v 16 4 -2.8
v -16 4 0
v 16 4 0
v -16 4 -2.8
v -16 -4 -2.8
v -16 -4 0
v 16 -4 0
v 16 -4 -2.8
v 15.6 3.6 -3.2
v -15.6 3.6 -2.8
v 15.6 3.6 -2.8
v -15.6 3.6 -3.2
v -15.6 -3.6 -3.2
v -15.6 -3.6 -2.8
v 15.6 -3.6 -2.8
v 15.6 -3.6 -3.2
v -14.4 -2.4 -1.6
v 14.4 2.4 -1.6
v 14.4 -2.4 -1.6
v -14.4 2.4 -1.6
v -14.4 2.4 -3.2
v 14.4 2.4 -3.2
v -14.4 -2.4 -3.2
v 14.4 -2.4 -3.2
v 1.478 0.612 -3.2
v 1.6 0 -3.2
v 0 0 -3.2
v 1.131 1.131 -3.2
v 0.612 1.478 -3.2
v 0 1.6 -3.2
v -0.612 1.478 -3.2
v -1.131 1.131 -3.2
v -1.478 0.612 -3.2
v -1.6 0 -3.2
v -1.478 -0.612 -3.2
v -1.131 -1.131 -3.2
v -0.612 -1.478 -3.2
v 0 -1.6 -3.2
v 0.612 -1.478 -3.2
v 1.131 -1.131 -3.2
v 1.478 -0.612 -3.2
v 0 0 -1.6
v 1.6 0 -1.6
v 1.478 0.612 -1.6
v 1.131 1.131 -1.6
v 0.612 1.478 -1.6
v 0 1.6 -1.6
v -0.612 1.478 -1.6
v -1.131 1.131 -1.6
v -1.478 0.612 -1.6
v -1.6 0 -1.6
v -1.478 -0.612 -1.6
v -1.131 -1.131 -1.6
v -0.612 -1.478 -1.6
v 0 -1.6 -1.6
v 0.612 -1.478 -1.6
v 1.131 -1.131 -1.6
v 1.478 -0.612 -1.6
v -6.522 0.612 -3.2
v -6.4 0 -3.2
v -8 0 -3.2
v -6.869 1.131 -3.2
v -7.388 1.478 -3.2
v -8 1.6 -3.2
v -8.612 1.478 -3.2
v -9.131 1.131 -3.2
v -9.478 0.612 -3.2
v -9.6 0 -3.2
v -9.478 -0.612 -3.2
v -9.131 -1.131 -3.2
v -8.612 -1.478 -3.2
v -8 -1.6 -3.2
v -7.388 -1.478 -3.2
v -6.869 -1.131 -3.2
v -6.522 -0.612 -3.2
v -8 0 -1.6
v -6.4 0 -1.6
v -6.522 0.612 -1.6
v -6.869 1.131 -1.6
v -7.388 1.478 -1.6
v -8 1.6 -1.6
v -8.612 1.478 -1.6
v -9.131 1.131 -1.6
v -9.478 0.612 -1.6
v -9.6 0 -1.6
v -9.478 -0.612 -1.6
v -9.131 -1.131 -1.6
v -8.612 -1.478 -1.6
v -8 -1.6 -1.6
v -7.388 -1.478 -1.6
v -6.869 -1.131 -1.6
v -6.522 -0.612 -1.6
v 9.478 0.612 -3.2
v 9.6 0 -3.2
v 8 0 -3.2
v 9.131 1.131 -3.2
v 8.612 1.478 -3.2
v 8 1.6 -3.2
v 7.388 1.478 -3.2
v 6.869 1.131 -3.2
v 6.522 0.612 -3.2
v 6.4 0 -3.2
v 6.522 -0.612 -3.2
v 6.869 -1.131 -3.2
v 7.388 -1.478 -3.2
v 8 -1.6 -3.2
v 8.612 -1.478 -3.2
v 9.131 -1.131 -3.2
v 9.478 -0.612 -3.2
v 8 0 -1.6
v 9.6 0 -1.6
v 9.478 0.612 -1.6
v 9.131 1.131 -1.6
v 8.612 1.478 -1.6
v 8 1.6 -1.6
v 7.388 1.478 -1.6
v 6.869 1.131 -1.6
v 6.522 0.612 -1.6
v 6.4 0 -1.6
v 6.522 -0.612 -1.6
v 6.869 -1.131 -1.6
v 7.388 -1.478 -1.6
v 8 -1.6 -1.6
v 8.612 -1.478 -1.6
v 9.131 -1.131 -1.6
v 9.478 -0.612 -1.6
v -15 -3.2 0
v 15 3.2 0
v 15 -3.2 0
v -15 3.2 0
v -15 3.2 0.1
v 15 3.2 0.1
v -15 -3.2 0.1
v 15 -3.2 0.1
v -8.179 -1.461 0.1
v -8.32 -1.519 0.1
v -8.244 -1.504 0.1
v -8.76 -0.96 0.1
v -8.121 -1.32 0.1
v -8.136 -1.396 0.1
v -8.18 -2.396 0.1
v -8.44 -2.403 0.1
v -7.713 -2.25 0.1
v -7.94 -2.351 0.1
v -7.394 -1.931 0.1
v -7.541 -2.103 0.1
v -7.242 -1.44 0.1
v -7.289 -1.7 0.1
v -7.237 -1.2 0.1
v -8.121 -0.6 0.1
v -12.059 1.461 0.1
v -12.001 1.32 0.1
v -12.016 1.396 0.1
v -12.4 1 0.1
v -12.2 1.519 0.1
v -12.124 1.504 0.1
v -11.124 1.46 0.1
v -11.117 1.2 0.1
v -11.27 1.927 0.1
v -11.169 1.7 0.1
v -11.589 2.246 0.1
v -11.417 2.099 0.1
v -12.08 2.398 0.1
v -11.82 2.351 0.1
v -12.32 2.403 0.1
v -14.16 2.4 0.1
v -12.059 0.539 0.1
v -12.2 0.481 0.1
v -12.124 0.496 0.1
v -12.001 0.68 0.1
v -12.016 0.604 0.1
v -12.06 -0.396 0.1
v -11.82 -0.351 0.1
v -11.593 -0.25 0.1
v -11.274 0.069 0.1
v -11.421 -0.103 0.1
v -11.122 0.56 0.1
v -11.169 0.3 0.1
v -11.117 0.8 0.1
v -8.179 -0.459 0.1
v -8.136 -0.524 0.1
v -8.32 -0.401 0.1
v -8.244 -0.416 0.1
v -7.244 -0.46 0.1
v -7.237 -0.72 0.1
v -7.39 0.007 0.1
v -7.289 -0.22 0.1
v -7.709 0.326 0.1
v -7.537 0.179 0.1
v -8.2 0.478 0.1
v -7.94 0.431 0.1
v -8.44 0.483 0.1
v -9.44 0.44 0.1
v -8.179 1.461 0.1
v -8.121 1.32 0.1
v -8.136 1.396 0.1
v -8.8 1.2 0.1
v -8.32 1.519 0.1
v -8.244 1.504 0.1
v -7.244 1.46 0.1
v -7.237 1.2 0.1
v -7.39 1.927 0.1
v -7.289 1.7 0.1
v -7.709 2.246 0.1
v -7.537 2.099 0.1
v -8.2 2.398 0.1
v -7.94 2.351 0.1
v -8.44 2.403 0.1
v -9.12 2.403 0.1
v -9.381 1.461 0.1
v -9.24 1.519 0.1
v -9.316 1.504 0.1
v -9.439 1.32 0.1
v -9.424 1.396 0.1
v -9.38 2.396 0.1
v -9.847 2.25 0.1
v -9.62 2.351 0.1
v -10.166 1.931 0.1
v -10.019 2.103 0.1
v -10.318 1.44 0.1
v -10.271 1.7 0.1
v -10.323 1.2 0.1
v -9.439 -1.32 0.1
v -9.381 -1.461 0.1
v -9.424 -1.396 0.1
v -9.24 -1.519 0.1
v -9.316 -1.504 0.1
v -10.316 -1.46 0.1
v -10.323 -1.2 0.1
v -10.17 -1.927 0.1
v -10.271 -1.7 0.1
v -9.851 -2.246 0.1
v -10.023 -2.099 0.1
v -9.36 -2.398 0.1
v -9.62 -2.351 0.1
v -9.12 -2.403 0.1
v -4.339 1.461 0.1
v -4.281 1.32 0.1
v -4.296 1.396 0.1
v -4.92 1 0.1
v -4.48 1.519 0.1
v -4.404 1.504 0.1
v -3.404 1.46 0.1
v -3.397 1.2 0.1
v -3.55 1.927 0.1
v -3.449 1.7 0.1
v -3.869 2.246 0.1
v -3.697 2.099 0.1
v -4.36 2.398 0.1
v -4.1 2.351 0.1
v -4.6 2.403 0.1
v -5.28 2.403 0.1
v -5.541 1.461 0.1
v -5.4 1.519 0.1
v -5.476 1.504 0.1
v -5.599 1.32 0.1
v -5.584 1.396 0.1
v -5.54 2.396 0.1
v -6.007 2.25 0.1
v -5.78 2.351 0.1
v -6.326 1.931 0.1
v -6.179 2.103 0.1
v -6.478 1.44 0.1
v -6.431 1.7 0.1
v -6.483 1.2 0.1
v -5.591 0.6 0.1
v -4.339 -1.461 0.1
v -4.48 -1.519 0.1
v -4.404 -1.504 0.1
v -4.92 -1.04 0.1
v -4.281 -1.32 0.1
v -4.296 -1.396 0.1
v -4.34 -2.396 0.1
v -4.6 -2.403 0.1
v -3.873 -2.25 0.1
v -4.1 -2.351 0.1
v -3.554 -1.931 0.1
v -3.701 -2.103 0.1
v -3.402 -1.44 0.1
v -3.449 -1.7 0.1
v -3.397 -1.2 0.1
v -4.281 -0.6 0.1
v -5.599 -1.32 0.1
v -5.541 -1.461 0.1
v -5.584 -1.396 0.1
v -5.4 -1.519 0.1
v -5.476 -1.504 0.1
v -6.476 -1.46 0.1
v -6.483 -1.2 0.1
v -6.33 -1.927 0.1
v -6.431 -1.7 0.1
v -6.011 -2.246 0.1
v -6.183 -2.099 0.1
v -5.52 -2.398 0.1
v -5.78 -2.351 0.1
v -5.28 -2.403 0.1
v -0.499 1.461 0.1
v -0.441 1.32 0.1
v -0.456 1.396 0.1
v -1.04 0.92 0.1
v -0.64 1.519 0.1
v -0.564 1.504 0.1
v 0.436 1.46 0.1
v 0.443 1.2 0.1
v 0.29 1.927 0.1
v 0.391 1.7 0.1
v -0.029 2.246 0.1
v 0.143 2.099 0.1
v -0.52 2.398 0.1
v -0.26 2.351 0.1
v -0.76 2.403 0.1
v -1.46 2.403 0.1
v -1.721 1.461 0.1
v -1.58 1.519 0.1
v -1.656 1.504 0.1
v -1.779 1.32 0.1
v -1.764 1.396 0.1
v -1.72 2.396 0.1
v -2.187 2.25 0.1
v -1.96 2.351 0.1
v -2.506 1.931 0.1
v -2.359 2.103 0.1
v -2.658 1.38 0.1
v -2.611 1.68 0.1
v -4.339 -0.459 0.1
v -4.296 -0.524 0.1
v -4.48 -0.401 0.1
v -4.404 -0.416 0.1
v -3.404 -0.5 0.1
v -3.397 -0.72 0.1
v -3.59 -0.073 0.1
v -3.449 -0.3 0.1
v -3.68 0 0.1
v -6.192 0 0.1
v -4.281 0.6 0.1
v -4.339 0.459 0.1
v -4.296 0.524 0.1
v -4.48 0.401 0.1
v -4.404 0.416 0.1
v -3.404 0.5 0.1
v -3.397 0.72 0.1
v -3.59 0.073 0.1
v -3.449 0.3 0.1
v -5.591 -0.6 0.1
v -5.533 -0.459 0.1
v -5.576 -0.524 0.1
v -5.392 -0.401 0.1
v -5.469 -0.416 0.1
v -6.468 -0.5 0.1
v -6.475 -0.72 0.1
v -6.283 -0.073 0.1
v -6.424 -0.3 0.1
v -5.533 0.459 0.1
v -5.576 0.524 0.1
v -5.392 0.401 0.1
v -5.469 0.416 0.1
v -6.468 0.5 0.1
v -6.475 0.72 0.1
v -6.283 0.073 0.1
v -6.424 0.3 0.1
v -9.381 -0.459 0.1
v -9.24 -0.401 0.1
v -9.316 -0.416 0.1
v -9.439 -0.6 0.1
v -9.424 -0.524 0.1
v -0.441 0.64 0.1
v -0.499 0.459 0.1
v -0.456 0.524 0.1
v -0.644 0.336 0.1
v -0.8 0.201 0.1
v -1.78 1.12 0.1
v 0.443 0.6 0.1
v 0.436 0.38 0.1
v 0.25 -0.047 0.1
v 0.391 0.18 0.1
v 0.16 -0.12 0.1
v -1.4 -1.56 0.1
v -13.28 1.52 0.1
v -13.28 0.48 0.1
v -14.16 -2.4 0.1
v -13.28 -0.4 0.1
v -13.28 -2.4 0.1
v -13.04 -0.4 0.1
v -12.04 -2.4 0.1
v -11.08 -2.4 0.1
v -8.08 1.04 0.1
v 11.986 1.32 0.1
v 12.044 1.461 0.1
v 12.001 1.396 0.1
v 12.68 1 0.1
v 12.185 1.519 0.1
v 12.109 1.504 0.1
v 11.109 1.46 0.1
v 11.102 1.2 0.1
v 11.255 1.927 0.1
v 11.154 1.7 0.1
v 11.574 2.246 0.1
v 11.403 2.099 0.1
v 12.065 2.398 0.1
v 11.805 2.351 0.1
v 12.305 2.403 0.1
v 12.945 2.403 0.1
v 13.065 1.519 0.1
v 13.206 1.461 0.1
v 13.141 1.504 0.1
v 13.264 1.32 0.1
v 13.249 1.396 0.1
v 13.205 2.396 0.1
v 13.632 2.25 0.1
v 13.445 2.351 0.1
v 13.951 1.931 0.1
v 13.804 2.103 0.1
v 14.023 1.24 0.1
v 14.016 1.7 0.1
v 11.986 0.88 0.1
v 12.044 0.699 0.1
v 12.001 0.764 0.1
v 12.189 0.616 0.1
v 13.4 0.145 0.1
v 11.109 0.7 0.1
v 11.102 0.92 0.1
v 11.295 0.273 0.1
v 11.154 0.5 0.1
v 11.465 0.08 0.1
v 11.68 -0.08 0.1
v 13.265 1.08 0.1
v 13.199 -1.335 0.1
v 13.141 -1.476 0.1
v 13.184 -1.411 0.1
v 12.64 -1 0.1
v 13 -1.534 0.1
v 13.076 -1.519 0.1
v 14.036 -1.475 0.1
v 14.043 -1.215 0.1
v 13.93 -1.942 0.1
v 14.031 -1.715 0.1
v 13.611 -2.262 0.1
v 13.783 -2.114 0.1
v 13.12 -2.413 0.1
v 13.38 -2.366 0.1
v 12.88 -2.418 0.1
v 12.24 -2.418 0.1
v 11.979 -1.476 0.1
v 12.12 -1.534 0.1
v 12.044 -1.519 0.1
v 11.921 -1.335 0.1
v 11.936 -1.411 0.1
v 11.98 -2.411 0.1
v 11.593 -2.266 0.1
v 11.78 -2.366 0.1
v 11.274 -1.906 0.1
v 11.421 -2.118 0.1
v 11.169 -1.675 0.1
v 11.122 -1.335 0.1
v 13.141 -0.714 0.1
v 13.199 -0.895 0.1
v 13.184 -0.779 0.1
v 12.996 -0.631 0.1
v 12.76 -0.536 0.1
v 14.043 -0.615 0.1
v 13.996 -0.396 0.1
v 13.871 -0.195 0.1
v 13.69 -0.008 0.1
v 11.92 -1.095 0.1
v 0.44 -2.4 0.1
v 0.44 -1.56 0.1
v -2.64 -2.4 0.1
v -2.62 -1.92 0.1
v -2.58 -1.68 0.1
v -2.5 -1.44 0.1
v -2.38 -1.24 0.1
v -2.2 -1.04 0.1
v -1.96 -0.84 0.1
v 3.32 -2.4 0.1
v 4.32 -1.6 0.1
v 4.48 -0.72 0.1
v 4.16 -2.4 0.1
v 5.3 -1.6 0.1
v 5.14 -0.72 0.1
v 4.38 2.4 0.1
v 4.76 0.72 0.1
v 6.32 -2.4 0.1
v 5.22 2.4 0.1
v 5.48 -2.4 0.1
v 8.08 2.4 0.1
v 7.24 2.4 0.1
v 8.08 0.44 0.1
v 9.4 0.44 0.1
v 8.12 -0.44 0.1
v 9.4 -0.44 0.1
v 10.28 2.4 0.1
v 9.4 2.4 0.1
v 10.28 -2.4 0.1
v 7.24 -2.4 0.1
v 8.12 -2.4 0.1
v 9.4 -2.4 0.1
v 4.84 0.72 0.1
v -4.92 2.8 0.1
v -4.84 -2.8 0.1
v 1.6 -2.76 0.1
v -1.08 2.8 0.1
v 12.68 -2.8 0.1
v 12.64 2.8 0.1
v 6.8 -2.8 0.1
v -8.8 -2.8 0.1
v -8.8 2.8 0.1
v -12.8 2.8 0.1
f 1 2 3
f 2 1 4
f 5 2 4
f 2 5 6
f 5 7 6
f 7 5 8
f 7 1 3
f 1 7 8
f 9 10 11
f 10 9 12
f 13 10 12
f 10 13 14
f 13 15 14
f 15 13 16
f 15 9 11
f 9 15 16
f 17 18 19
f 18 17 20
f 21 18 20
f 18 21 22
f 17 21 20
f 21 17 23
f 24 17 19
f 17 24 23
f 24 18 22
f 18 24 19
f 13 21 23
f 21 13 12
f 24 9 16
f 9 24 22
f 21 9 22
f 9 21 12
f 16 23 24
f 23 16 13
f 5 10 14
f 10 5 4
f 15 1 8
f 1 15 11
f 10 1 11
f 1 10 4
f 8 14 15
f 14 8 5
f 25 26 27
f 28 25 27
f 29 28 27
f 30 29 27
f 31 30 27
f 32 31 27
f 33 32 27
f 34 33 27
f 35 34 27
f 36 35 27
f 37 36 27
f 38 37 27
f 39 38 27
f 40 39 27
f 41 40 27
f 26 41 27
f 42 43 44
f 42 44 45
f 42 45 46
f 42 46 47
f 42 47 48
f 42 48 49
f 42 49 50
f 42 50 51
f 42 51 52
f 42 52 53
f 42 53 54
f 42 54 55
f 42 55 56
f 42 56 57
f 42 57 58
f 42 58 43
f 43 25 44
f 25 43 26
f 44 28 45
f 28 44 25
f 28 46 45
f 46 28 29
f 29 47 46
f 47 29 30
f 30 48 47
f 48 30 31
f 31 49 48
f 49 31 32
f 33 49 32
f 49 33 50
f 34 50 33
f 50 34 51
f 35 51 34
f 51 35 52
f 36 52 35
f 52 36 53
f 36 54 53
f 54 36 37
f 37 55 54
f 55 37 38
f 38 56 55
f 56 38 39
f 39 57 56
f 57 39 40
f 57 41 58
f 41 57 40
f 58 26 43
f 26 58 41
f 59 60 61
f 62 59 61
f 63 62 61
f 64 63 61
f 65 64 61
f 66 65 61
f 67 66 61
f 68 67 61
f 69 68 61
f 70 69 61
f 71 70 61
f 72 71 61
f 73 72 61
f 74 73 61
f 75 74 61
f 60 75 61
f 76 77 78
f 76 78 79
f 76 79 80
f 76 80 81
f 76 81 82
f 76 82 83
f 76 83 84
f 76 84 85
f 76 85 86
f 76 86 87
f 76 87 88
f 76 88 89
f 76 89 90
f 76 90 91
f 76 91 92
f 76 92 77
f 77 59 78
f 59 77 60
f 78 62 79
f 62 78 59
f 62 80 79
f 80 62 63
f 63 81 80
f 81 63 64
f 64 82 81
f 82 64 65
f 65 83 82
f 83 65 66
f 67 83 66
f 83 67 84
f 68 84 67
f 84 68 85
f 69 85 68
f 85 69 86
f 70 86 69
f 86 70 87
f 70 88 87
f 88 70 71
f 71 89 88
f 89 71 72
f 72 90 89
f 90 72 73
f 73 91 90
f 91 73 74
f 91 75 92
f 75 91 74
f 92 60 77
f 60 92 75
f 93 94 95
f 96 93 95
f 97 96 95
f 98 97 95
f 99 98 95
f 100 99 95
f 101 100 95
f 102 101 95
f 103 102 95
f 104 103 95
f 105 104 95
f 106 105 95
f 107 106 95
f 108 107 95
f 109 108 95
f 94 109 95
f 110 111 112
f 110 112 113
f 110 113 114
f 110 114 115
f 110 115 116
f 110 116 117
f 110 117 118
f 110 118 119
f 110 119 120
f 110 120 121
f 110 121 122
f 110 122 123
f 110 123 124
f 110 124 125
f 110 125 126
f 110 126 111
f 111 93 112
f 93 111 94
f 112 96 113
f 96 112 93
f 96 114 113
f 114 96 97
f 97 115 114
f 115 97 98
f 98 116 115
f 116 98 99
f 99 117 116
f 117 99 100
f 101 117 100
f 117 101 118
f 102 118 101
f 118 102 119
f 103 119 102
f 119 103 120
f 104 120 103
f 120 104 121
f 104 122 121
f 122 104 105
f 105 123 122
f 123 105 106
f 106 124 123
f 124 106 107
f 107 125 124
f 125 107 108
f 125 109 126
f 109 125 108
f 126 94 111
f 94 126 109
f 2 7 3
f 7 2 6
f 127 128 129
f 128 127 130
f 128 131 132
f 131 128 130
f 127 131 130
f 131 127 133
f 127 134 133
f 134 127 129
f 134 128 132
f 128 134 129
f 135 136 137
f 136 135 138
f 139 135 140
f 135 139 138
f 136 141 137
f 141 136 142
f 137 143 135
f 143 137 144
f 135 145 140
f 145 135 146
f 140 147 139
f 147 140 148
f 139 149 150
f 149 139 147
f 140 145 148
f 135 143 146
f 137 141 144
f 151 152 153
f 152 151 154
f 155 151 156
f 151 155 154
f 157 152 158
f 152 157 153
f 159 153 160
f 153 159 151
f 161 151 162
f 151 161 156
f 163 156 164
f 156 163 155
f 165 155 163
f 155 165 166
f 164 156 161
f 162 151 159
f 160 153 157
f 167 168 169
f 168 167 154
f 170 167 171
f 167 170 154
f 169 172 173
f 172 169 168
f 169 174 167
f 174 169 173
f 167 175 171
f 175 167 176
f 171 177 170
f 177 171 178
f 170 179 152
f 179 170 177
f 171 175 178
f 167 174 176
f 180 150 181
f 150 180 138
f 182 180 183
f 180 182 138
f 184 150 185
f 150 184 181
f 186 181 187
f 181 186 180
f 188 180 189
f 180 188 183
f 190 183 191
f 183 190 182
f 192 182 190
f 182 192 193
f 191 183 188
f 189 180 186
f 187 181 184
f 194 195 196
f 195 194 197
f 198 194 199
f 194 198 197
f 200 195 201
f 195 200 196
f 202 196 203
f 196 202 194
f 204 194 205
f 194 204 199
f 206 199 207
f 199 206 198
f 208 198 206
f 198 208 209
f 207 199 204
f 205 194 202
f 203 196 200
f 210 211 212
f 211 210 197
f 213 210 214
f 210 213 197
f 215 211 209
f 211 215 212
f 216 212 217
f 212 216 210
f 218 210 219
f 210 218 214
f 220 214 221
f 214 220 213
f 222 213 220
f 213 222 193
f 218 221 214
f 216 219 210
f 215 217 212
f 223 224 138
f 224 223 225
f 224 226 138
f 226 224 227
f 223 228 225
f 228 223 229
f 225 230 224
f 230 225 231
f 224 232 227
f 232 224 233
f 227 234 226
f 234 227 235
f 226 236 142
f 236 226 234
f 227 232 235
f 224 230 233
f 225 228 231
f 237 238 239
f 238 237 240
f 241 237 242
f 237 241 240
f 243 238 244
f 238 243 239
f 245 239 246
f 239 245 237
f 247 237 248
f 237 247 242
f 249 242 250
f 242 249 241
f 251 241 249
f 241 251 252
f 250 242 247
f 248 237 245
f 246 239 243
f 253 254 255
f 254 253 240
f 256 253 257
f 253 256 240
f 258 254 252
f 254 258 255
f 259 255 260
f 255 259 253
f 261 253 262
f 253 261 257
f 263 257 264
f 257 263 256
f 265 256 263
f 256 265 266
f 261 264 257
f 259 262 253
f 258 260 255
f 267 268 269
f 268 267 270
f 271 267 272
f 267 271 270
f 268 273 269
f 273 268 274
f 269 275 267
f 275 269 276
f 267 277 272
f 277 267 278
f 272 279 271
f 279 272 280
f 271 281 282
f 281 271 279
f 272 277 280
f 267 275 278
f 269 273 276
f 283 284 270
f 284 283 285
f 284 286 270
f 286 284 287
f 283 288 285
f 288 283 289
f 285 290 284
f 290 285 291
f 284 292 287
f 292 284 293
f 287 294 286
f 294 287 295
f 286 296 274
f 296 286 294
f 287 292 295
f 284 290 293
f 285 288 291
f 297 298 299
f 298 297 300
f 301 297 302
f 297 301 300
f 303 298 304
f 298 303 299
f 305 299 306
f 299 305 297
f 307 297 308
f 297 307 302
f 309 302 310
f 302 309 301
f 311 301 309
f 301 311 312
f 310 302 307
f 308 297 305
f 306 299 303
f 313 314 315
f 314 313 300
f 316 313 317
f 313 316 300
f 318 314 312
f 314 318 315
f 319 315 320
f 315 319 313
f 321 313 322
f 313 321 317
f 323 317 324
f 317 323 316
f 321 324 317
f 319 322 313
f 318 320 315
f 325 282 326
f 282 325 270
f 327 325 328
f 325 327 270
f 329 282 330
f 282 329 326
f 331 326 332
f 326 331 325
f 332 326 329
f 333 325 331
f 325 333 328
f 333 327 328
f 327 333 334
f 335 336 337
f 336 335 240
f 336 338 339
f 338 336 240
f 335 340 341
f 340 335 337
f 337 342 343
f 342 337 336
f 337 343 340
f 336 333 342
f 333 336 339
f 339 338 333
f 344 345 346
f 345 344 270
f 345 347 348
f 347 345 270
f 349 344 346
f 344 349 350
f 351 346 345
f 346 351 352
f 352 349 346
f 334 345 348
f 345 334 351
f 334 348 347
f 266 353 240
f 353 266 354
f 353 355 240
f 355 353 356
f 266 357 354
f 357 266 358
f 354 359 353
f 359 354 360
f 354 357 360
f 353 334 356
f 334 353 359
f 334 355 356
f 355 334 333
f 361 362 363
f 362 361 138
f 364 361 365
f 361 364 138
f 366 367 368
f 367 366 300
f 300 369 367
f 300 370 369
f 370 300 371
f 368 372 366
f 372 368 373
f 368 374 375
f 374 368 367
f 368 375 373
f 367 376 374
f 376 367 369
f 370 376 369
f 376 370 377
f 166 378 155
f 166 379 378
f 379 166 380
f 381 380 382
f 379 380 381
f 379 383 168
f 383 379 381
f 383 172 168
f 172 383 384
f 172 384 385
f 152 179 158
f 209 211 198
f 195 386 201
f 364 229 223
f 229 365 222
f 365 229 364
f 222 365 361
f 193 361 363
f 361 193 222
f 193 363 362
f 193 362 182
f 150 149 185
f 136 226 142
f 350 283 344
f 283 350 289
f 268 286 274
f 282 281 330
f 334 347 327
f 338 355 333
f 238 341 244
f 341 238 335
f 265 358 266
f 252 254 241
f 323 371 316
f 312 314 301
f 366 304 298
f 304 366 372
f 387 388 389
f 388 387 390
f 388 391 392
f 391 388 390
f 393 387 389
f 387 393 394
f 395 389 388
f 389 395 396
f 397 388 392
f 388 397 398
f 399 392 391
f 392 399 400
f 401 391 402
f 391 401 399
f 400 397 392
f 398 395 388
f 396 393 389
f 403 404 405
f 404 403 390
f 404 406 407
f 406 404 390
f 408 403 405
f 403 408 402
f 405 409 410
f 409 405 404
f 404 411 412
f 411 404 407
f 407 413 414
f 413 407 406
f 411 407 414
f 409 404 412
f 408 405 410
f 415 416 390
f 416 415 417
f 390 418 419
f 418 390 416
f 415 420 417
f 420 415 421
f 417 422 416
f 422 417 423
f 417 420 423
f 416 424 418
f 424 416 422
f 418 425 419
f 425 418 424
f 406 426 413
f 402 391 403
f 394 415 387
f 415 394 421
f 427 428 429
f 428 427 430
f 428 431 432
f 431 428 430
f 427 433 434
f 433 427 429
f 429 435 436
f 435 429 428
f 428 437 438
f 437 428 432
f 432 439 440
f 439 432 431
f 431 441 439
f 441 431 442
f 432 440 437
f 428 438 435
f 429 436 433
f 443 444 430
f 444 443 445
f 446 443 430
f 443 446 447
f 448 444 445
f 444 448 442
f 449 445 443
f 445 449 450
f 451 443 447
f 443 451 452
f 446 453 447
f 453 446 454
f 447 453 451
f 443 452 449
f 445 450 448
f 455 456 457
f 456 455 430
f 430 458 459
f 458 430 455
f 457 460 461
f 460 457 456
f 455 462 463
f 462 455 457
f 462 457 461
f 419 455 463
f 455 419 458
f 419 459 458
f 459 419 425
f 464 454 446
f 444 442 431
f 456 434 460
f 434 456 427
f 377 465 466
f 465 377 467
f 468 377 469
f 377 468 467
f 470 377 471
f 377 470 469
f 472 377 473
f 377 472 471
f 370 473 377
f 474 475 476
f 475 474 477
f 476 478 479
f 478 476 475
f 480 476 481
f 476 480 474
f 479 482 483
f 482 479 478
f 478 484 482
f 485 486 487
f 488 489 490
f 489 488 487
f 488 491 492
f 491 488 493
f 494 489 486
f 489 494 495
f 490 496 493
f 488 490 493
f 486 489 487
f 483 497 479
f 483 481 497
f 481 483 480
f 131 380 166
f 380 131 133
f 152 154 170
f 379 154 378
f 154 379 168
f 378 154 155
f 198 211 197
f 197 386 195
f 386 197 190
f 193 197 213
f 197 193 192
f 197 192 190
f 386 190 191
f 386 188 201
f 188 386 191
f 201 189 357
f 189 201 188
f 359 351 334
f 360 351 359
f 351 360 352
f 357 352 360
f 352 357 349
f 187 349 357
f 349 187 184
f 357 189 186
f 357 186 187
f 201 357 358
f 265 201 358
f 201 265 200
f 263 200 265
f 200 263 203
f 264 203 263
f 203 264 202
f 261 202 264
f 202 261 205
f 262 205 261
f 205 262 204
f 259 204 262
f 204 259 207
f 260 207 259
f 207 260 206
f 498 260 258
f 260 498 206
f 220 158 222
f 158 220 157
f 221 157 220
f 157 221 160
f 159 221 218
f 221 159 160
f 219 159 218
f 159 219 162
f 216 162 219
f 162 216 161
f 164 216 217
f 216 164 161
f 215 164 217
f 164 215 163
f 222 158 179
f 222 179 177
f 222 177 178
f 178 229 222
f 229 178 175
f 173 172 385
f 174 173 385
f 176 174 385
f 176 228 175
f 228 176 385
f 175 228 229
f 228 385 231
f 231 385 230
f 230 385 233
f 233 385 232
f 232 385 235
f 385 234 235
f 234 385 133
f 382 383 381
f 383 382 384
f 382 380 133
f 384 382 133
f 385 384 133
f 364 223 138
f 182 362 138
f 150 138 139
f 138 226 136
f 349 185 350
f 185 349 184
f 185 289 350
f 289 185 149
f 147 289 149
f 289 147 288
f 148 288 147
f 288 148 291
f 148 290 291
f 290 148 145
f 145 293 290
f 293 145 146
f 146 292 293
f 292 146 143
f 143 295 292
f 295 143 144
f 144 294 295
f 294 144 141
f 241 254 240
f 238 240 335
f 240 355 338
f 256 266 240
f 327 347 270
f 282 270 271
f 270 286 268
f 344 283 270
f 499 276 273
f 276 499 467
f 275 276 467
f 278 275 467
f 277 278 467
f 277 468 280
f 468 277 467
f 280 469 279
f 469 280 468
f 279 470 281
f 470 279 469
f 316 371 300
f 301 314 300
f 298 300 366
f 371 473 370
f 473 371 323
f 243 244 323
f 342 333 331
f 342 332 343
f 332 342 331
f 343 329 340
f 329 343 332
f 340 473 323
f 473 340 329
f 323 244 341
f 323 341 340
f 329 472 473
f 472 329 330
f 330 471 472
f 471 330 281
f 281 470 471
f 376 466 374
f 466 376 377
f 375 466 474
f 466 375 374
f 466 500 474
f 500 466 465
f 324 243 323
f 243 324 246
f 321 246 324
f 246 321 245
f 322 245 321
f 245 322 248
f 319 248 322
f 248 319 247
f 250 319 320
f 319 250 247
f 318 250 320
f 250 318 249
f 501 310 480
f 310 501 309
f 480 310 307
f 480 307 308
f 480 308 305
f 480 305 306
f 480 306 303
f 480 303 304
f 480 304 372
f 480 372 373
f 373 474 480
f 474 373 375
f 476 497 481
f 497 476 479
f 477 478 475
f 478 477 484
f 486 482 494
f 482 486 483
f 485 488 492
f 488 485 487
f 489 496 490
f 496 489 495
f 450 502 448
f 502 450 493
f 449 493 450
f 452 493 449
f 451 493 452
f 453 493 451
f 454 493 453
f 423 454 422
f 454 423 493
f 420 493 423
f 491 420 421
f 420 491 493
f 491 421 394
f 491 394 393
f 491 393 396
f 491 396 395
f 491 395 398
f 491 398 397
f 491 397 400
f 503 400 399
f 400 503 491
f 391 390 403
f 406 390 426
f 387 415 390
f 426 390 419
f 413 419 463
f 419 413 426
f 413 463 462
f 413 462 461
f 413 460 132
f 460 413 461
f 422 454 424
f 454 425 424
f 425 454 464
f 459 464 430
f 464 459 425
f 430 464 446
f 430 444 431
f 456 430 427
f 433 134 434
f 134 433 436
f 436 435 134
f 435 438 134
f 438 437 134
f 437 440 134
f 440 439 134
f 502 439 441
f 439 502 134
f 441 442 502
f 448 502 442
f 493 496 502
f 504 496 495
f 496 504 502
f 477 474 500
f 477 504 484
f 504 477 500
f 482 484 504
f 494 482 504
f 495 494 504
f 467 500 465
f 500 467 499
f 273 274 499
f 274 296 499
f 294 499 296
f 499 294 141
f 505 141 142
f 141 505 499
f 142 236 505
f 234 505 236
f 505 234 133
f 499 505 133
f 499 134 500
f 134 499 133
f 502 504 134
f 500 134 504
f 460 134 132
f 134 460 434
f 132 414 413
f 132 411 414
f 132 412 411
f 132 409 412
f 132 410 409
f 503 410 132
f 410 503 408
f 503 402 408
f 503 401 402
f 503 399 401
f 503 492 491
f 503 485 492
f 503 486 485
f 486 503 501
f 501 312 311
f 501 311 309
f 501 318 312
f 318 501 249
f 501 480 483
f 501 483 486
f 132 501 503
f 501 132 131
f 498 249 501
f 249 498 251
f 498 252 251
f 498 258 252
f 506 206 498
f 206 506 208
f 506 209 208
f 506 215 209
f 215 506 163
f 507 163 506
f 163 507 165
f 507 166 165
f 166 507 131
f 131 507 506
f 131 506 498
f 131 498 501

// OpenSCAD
use <../lib.scad>
use <2431.scad>
use <6062886c.scad>
function ldraw_lib__2431d08() = [
// 0 Tile  1 x  4 with "R682 AHS" on Yellow Background Sticker
// 0 Name: 2431d08.dat
// 0 Author: Evert-Jan Boer [ejboer]
// 0 !LDRAW_ORG Shortcut UPDATE 2024-10
// 0 !LICENSE Licensed under CC BY 4.0 : see CAreadme.txt
// 
// 0 BFC CERTIFY CCW
  [0,"BFC","CERTIFY"],
  [0,"BFC","CCW"],
// 
// 0 !CATEGORY Sticker Shortcut
// 0 !KEYWORDS Bricklink 2431pb568, Mini Cooper, set 10242
// 
// 0 !HISTORY 2024-09-30 [OrionP] Official Update 2024-08
// 0 !HISTORY 2024-11-09 [MagFors] Update description
// 0 !HISTORY 2024-12-01 [OrionP] Official Update 2024-10
// 
// 1 16 0 0 0 1 0 0 0 1 0 0 0 1 2431.dat
  [1,16,0,0,0,1,0,0,0,1,0,0,0,1, ldraw_lib__2431()],
// 1 16 0 0 0 1 0 0 0 1 0 0 0 1 6062886c.dat
  [1,16,0,0,0,1,0,0,0,1,0,0,0,1, ldraw_lib__6062886c()],
];
module ldraw_lib__2431d08(step=0, col=false, unit=2/5, alt=false, line=0.2, solid=!$preview)
    makepoly(ldraw_lib__2431d08(), step=step, col=col, unit=unit, alt=alt, line=line, solid=solid);
ldraw_lib__2431d08(line=0.2);
